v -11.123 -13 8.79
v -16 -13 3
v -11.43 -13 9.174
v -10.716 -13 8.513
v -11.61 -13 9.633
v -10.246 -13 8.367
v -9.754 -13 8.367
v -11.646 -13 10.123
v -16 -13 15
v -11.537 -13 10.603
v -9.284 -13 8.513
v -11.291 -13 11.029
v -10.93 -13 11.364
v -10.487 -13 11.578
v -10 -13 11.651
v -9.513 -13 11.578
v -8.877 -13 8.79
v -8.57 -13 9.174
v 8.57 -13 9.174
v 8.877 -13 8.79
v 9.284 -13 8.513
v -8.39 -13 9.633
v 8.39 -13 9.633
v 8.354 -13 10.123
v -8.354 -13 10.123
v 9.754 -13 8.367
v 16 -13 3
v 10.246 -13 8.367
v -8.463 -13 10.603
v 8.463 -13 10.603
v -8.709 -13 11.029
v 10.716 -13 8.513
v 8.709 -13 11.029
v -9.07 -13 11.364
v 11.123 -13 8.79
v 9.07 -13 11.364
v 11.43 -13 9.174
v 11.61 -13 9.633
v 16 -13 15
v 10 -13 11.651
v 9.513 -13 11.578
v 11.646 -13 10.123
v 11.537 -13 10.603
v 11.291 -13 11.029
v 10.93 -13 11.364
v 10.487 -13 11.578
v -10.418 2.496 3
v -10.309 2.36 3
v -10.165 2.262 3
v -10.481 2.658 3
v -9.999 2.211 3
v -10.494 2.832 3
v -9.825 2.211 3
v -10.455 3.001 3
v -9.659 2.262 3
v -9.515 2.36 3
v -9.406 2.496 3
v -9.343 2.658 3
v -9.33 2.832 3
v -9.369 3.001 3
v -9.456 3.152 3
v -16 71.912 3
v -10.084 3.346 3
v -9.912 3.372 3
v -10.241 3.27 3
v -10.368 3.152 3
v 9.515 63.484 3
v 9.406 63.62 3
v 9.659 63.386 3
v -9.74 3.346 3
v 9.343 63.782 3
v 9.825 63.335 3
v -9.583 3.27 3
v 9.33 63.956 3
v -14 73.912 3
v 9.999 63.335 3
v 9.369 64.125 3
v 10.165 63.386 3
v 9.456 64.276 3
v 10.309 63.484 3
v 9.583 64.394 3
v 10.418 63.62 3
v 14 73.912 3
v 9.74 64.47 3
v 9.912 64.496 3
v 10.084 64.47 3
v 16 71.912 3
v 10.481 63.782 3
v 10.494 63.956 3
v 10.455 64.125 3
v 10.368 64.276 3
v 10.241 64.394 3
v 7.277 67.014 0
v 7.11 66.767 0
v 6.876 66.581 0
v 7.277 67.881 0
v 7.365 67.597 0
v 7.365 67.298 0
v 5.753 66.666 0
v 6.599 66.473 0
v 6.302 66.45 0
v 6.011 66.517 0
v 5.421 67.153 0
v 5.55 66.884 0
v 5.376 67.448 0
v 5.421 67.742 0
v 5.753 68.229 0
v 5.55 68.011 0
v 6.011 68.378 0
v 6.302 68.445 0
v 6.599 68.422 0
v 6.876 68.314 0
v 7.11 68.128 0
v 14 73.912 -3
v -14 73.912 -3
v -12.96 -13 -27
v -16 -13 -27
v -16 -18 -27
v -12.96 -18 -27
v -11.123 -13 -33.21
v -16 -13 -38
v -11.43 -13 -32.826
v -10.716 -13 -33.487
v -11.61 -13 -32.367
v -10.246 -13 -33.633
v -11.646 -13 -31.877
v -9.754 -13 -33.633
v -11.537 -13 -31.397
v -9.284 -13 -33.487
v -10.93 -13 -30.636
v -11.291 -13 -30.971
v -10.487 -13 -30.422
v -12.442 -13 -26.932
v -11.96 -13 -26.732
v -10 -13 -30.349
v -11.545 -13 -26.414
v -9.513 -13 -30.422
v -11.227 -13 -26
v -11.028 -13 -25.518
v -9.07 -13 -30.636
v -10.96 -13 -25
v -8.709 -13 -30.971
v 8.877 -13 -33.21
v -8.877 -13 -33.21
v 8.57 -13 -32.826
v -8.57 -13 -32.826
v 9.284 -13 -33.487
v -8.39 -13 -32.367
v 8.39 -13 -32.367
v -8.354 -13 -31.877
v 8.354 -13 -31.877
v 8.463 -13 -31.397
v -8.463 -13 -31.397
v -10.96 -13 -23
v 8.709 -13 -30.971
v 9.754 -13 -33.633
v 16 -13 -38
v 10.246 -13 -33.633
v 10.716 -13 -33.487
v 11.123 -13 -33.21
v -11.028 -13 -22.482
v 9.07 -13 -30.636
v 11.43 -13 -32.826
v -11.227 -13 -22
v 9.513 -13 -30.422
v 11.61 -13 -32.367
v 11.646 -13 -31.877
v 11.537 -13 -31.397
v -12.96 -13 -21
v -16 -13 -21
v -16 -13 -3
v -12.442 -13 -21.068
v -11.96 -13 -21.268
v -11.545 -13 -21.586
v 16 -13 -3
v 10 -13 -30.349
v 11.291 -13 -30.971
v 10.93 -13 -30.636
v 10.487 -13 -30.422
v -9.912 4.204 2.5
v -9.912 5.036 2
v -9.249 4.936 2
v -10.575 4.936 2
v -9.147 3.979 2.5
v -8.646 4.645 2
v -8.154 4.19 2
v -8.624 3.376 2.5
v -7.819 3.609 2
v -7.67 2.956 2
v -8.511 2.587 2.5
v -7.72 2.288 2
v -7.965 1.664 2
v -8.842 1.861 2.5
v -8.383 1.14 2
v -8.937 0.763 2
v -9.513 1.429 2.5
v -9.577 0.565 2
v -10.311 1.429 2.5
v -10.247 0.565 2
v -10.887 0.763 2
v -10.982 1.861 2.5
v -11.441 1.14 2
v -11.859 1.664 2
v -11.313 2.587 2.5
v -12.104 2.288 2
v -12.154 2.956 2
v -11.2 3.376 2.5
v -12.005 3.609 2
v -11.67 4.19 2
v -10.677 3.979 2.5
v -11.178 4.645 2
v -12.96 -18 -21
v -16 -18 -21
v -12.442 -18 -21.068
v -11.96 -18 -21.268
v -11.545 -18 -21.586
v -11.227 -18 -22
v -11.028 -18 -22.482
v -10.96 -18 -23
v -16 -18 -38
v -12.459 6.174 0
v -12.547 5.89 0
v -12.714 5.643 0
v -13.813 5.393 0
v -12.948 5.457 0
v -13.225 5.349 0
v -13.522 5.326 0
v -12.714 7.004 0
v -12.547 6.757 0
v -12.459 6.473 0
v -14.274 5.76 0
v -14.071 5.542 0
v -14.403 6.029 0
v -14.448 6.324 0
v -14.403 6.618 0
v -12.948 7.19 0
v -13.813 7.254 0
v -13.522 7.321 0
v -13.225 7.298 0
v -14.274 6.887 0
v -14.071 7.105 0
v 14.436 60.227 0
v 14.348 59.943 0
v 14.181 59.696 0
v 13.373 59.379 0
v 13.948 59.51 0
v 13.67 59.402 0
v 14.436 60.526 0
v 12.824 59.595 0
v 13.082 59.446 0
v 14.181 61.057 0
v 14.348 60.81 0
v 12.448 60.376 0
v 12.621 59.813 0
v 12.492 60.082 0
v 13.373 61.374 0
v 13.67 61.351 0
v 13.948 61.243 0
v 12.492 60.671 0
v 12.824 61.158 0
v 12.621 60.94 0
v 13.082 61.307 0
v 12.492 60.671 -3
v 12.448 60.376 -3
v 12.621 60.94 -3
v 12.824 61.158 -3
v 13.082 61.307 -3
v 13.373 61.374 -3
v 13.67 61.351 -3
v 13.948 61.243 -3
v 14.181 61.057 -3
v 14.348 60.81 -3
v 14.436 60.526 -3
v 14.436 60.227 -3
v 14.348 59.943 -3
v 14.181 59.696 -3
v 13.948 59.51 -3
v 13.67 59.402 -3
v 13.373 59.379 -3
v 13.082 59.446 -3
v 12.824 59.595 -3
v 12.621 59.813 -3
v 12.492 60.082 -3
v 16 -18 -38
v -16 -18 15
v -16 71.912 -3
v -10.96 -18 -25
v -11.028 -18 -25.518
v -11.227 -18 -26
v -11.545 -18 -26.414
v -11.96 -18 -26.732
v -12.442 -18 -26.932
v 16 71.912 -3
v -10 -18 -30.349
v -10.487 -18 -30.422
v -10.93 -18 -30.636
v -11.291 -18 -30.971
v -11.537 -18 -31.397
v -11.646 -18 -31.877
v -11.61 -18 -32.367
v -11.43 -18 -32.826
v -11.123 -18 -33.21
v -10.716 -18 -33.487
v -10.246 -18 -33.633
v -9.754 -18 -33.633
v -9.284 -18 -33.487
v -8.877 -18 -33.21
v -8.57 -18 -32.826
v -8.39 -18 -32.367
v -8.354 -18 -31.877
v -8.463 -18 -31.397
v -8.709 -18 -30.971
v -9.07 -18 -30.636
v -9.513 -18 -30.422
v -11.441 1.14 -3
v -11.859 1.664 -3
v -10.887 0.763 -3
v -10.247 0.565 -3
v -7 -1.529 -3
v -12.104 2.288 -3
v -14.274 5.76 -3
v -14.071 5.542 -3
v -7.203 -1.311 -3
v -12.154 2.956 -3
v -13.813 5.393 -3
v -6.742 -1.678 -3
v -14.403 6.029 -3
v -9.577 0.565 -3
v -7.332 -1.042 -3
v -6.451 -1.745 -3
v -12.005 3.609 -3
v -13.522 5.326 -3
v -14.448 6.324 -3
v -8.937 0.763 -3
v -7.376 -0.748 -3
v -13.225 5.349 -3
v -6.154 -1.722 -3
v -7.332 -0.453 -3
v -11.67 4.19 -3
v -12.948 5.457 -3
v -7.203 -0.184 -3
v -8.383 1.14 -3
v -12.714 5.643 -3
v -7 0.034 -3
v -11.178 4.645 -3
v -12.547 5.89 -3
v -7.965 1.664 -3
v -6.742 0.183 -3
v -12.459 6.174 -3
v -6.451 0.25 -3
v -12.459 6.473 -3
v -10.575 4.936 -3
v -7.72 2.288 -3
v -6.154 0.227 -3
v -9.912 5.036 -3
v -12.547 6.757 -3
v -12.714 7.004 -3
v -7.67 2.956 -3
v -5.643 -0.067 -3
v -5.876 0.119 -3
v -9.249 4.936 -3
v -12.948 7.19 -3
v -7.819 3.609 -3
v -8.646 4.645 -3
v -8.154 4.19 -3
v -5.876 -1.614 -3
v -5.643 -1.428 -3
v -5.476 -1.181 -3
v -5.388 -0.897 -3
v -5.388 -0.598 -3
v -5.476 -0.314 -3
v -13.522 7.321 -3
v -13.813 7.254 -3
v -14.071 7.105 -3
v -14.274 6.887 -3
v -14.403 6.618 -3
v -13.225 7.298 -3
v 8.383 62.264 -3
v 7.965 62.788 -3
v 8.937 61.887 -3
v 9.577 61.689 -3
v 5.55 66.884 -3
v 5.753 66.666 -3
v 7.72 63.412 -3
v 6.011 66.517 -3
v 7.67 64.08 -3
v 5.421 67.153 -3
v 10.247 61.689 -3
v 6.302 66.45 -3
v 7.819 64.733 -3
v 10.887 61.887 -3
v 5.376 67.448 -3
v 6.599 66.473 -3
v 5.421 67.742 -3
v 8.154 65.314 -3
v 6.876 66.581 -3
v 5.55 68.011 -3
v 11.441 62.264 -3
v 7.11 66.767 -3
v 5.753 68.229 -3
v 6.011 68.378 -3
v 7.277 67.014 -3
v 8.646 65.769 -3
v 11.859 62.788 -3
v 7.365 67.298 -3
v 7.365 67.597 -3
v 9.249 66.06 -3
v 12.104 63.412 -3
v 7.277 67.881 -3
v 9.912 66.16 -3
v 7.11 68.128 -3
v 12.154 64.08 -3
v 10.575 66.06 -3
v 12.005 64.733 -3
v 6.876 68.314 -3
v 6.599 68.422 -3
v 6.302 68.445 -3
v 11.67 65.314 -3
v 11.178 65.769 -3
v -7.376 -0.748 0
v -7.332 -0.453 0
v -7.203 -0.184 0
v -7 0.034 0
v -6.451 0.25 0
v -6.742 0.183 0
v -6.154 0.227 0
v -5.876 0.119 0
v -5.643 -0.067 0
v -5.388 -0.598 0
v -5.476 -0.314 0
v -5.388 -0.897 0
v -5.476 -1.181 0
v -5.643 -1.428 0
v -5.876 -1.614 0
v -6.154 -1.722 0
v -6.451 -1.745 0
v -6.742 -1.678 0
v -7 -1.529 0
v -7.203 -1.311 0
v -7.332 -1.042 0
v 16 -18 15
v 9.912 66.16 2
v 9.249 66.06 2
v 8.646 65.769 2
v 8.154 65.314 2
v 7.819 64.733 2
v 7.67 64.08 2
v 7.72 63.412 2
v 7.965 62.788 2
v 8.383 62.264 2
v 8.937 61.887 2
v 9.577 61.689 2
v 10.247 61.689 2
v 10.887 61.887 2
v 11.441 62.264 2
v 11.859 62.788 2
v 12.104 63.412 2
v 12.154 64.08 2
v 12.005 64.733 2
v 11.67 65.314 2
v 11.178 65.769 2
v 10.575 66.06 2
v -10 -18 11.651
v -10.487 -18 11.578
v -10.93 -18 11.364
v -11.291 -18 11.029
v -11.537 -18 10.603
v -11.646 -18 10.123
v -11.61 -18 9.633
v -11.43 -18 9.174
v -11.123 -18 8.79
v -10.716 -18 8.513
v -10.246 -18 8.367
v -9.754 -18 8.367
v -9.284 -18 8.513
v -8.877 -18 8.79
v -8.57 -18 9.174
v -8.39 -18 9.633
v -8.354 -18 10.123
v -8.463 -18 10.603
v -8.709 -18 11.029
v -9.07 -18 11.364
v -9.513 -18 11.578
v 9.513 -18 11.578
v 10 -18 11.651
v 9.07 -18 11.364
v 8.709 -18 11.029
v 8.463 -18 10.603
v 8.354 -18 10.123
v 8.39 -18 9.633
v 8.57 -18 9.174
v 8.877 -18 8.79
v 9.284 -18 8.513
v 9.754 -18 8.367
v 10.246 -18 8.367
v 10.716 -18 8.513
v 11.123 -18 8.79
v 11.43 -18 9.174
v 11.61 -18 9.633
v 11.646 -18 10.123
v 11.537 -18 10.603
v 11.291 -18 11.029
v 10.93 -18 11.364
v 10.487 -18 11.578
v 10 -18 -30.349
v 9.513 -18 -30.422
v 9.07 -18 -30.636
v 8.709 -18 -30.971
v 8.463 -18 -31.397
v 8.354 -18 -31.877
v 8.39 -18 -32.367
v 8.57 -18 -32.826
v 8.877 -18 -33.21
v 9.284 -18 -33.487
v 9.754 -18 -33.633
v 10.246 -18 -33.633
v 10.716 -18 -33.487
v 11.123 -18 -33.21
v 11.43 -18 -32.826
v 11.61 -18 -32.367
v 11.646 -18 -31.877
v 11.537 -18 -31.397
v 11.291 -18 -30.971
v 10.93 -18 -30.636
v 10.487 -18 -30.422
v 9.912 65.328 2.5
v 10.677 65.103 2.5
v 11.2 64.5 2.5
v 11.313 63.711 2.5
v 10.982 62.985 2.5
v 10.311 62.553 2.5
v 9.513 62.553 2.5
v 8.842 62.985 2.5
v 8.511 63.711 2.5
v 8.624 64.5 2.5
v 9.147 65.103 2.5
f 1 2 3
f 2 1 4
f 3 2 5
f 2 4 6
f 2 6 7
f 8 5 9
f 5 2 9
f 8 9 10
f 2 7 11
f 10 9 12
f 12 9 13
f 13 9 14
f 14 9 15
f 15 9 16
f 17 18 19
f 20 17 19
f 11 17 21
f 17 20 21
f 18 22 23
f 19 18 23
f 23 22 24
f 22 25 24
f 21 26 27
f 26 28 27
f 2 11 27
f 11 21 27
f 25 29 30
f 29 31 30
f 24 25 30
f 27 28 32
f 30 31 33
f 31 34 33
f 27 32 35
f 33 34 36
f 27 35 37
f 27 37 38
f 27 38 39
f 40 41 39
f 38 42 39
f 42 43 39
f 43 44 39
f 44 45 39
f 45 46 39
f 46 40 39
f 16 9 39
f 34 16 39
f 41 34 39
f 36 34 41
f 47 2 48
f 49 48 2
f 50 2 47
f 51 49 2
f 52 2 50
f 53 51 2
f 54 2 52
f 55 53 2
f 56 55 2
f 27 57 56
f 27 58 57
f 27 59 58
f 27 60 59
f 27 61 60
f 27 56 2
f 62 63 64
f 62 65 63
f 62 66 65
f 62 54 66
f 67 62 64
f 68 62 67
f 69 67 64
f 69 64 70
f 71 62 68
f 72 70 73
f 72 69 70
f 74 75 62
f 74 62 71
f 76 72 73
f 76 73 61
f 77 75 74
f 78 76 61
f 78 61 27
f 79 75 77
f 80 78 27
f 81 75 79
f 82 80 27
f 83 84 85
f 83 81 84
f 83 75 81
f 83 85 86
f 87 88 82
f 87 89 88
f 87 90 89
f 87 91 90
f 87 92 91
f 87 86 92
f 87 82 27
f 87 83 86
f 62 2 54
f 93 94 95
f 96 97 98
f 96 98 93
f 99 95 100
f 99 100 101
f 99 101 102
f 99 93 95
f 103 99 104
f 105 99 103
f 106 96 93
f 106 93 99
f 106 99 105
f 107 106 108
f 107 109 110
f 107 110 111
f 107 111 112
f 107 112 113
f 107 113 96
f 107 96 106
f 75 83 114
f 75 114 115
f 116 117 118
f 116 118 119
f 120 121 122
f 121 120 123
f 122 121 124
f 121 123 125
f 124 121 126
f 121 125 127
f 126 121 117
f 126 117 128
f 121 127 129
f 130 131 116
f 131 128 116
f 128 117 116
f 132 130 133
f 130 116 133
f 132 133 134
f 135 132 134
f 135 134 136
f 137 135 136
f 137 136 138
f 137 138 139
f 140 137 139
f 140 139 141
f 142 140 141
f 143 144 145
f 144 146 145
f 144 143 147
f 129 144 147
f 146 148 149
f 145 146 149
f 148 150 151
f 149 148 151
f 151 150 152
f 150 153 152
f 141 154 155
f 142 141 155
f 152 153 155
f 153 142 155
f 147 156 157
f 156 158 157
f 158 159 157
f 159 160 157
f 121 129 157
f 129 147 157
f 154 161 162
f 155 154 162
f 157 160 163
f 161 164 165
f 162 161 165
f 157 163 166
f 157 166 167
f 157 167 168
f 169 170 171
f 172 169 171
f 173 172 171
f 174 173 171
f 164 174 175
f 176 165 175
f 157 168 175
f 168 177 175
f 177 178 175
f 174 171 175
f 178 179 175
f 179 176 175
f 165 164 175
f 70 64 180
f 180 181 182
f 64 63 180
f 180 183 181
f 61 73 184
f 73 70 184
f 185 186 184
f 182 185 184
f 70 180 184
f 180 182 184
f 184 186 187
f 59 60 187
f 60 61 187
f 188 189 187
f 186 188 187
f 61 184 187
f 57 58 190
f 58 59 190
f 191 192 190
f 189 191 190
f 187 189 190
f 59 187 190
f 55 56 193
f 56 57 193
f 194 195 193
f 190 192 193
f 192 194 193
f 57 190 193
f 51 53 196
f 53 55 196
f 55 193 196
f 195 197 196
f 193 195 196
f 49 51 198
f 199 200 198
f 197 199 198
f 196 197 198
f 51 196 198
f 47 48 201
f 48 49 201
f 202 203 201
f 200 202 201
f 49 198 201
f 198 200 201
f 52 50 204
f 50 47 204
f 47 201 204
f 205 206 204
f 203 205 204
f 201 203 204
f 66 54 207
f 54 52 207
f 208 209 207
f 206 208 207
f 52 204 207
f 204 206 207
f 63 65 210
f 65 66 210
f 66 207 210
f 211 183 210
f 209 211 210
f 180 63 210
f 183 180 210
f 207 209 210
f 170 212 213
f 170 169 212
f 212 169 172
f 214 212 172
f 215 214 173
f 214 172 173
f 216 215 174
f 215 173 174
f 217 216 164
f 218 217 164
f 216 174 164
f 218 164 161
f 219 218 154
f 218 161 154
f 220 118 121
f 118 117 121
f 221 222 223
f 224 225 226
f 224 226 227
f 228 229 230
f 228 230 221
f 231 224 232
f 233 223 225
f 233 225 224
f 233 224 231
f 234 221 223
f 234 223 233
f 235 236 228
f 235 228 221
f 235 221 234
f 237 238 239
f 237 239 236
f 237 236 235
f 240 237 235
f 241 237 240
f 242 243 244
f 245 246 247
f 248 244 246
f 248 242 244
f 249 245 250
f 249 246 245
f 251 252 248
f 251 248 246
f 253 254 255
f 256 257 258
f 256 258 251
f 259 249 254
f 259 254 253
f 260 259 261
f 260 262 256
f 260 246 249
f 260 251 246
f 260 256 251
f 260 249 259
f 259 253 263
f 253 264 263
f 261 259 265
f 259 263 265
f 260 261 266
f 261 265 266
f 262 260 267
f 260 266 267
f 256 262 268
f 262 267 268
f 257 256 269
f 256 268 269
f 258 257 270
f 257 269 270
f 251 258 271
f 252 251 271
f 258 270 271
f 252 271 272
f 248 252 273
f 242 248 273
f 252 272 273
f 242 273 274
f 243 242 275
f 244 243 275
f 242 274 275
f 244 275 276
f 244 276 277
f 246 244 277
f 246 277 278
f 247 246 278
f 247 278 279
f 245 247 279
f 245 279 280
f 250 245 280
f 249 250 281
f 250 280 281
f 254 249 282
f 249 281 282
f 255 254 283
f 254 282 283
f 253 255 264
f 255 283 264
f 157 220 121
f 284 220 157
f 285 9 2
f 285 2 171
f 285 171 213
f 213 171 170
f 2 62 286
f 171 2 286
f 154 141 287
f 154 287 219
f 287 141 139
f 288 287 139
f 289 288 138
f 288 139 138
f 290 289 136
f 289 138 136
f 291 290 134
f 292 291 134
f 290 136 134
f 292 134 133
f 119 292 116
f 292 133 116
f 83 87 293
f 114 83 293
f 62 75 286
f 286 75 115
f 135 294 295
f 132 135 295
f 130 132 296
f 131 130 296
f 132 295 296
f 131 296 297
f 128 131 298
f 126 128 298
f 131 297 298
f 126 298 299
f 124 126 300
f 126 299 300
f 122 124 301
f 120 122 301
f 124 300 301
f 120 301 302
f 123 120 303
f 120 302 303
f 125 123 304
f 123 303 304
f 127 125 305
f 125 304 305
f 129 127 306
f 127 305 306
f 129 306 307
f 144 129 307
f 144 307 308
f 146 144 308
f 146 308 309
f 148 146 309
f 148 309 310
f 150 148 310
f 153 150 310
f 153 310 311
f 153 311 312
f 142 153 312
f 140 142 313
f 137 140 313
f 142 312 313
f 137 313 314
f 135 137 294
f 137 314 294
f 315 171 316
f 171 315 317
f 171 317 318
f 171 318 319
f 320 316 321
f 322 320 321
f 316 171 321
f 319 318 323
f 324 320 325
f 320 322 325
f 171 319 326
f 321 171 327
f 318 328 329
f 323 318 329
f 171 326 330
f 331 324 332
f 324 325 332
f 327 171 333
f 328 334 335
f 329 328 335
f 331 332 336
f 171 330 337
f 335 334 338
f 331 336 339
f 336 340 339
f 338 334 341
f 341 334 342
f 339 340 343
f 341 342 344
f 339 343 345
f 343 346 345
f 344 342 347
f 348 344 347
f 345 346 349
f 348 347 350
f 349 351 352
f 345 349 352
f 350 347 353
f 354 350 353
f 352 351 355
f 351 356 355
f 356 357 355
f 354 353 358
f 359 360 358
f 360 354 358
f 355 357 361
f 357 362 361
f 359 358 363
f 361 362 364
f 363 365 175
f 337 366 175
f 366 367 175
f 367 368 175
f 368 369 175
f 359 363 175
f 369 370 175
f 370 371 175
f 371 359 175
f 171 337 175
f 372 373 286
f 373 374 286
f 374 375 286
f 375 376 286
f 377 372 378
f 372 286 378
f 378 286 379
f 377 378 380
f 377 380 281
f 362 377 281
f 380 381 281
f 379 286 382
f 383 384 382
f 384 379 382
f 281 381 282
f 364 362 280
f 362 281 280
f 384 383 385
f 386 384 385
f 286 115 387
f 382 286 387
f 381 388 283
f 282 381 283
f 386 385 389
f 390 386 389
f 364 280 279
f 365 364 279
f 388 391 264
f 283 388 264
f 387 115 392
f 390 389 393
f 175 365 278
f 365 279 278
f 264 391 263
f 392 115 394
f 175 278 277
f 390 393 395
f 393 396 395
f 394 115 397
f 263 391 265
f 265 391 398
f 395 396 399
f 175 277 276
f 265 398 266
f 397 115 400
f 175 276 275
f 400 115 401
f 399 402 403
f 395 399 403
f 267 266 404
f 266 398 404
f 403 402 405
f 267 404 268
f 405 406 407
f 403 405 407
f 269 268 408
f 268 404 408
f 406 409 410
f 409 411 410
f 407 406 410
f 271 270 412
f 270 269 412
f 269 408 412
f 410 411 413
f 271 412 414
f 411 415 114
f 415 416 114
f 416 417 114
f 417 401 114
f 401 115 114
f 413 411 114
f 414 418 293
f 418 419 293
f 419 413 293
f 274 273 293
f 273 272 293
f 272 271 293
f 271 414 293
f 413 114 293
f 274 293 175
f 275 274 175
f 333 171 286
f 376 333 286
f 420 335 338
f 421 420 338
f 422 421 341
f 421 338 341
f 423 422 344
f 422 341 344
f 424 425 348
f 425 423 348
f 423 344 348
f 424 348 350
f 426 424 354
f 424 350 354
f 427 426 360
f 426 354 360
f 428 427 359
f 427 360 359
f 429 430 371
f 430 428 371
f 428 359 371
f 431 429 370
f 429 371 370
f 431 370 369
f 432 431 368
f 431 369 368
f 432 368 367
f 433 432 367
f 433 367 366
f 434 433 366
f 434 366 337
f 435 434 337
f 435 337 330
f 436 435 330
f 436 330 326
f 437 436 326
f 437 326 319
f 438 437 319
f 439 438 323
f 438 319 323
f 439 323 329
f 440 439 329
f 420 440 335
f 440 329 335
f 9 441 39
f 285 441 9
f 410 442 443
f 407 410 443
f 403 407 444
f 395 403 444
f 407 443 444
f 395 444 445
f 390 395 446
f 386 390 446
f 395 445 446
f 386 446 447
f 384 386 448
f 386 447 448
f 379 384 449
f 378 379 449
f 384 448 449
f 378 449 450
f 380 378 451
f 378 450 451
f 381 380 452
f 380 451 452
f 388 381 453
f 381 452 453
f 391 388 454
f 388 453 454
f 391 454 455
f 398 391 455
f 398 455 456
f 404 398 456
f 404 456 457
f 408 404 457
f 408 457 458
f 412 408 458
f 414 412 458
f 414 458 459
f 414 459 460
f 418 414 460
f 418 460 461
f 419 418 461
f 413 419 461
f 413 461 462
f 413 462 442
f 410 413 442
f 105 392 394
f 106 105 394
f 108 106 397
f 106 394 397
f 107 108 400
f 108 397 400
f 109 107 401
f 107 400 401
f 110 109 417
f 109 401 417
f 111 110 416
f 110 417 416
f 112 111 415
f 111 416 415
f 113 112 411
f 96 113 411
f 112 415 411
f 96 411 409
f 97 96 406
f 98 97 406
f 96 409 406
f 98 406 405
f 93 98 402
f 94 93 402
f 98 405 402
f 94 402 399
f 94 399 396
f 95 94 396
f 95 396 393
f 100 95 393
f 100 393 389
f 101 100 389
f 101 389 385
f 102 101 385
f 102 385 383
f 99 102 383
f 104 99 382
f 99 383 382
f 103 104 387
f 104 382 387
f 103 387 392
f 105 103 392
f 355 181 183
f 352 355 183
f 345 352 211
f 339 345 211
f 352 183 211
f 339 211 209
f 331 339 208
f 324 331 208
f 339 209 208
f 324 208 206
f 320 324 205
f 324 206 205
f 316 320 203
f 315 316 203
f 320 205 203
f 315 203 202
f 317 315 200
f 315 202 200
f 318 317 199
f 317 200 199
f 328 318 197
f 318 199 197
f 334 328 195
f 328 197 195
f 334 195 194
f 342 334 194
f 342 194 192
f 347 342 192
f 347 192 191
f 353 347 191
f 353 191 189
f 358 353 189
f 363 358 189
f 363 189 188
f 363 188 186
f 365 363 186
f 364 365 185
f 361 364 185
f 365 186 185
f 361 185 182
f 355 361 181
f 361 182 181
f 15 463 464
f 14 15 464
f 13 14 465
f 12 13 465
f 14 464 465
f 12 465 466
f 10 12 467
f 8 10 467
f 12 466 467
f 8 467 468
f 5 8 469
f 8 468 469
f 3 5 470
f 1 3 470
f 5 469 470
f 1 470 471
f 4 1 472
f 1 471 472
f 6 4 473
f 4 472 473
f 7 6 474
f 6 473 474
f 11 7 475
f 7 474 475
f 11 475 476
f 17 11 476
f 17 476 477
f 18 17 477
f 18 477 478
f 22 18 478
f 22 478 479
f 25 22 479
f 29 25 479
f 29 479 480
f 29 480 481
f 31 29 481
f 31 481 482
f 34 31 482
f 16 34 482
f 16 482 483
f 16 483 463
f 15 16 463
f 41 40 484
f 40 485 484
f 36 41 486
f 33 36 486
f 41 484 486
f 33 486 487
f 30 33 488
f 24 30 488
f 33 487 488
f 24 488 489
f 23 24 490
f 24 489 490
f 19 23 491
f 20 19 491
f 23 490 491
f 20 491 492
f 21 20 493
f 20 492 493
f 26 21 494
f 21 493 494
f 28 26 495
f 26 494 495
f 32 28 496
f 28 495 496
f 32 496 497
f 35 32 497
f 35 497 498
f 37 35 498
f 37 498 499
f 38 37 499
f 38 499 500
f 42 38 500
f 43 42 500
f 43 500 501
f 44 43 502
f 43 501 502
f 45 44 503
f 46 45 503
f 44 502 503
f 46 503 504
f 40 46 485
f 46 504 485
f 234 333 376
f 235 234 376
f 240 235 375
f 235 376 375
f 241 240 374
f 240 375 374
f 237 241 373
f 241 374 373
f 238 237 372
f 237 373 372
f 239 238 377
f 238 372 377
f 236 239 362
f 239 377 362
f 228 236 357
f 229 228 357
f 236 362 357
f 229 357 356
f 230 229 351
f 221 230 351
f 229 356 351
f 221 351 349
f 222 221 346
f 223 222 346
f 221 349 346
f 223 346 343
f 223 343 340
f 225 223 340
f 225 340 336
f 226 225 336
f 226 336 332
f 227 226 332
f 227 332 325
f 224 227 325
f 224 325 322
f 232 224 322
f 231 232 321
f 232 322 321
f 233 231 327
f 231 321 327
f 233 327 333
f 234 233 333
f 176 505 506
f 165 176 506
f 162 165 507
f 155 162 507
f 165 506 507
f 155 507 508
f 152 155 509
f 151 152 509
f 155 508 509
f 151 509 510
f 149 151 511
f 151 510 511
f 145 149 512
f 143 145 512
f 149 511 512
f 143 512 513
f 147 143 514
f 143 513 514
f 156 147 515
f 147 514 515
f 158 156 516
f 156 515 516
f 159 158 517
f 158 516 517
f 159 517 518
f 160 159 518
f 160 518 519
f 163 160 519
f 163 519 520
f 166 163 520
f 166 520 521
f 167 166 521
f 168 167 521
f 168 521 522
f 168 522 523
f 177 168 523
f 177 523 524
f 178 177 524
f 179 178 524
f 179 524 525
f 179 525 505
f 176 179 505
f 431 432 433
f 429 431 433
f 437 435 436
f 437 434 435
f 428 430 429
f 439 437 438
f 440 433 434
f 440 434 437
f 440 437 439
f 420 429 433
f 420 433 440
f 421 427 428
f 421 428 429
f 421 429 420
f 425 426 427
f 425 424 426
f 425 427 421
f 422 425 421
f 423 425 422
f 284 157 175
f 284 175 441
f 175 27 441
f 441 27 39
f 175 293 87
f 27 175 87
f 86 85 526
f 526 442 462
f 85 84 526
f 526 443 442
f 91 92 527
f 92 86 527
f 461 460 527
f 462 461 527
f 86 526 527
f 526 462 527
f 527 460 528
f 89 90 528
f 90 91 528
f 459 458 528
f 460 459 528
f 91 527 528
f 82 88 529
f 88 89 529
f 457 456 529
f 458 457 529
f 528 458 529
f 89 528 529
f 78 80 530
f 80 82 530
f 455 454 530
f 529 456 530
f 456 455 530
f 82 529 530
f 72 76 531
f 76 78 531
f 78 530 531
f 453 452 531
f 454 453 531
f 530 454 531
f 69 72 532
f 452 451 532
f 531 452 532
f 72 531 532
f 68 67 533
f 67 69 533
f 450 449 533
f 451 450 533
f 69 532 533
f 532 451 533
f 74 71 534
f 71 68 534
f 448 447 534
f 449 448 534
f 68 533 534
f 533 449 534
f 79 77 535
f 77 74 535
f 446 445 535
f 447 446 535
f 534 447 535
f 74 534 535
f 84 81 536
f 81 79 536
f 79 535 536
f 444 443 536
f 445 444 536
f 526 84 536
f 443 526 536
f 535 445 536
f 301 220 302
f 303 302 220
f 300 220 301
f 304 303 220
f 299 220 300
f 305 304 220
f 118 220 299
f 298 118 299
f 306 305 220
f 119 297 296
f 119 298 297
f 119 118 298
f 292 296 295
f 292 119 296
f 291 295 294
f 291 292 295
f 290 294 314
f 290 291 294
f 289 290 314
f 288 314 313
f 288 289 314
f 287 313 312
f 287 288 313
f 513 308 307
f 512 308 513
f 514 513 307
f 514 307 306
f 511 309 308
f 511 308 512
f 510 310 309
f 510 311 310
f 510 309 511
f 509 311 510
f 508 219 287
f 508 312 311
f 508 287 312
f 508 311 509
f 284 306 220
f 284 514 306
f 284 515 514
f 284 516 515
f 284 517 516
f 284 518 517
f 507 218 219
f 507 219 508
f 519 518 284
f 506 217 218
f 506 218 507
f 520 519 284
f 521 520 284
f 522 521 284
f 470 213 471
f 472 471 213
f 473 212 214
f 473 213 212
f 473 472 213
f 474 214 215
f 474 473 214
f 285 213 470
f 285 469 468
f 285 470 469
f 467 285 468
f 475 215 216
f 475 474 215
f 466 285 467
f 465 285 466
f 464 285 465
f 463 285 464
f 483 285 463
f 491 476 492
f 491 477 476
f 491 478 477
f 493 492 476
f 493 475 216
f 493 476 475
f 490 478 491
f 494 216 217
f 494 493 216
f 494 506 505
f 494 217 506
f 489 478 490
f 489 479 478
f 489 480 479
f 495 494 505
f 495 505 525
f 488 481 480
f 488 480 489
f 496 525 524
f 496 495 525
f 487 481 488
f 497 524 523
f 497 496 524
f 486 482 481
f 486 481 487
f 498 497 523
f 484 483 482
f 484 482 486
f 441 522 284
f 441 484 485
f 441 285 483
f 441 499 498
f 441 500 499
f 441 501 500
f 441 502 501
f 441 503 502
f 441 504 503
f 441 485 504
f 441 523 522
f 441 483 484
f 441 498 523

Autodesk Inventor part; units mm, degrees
ref_plane "YZ Plane" through (0, 0, 0) normal (1, 0, 0) x (0, 1, 0)
ref_plane "XZ Plane" through (0, 0, 0) normal (0, 1, 0) x (-1, 0, 0)
ref_plane "XY Plane" through (0, 0, 0) normal (0, 0, 1) x (1, 0, 0)
sketch "Sketch1" plane through (0, 0, 0) normal (0, 1, 0) x (-1, 0, 0)
  line L0 (16, 3) -> (-16, 3)
  line L1 (-16, 3) -> (-16, -3)
  line L2 (-16, -3) -> (16, -3)
  line L3 (16, -3) -> (16, 3)
  line L4 (16, 3) -> (-16, -3) construction
  line L5 (-16, 3) -> (16, -3) construction
  point P0 (0, 0)
  dimension "POST_THICKNESS" = 6
  dimension "POST_WIDTH" = 32
extrude "Extrusion1" add sketch "Sketch1" along normal blind 73.912
sketch "Sketch5" plane through (16, 73.912, -3) normal (0, 0, -1) x (-1, 0, 0)
  line L0 (0, 0) -> (32, 0) projected
  line L1 (16.088, 0) -> (0, -16.088)
  line L2 (0, -73.912) -> (0, 0) projected
  circle A0 centre (6.088, -10) radius 1.75
  circle A1 centre (9.6235, -6.4645) radius 1
  circle A2 centre (2.5525, -13.5355) radius 1
  line L3 (32.1913, -64.8447) -> (19.6606, -77.3754)
  circle A3 centre (29.4475, -67.5885) radius 1
  circle A4 centre (22.3765, -74.6595) radius 1
  line L4 (32, -73.912) -> (32, 0) projected
  circle A5 centre (25.912, -71.124) radius 1.75
  line L5 (0, -73.912) -> (32, -73.912) projected
  point P0 (16, -73.912)
  point P1 (0, -58)
  point P2 (32, -58)
  dimension "d33" = 45
  dimension "d35" = 0
  dimension "d36" = 5
  dimension "d37" = 5
  dimension "d38" = 45
  dimension "d39" = 9.9999
  dimension "d42" = 0
  dimension "d43" = 5
  dimension "d44" = 2
  dimension "d45" = 2
  dimension "d46" = 2
  dimension "d47" = 2
  dimension "BOTTOM_MIRROR_HOLE" = 2.788
  dimension "TOP_MIRROR_HOLE" = 63.912
  dimension "d90" = 9.912
  dimension "d91" = 9.912
  dimension "d92" = 3.5
  dimension "d93" = 3.5
extrude "Extrusion3" cut sketch "Sketch5" against normal blind 3 contours A1 L1 | L1 A1 | A2 L1 | L1 A2 | L5 A4 L3 | A4 L5 | A3 L3 | L3 A3 | L3 A4 picked at (22.0928, -74.8345)
sketch "Sketch6" plane through (16, 0, -3) normal (0, 0, -1) x (-1, 0, 0)
  line L0 (0, 0) -> (0, 73.912) projected
  line L1 (0, 0) -> (32, 0) projected
  line L2 (0, 2) -> (32, 2)
  line L3 (32, 2) -> (32, 0)
  line L4 (32, 0) -> (0, 0)
  line L5 (0, 0) -> (0, 2)
  point P0 (16, 0)
  dimension "BASE_HEIGHT" = 2
extrude "Extrusion4" [suppressed]
sketch "Sketch7" plane through (-16, 2, -3) normal (0, 1, 0) x (1, 0, 0)
  line L0 (0, 35) -> (32, 35) projected
  line L1 (0, 0) -> (0, 35) projected
  line L2 (32, 0) -> (32, 35) projected
  point P0 (16, -3)
  point P1 (26, 29)
  point P2 (6, 29)
  dimension "d60" = 6
  dimension "d61" = 6
  dimension "d62" = 6
  dimension "d63" = 0
hole "Hole3" [suppressed]
sketch "Sketch8" plane through (16, 73.912, -3) normal (0, 0, -1) x (-1, 0, 0)
  line L0 (0, 0) -> (32, 0)
  line L1 (12.088, 0) -> (0, -12.088)
  line L2 (0, -60) -> (0, 0)
  circle A0 centre (6.088, -6) radius 1.651
  circle A1 centre (9.6235, -2.4645) radius 1
  circle A2 centre (2.5525, -9.5355) radius 1
  line L3 (32.1913, -28.7207) -> (19.6606, -41.2514)
  circle A3 centre (29.4475, -31.4645) radius 1
  circle A4 centre (22.3765, -38.5355) radius 1
  line L4 (32, -60) -> (32, 0)
  circle A5 centre (25.912, -35) radius 1.651
  point P0 (16, -73.912)
  point P1 (16, -60)
  point P2 (0, -58)
  point P3 (32, -58)
  dimension "d64" = 45
  dimension "d65" = 0
  dimension "d66" = 5
  dimension "d67" = 5
  dimension "d68" = 45
  dimension "d69" = 9.9999
  dimension "d70" = 0
  dimension "d71" = 5
  dimension "d72" = 2
  dimension "d73" = 2
  dimension "d74" = 2
  dimension "d75" = 2
hole "Hole4" [suppressed]
chamfer "Chamfer1" distance 2 angle 45 2 edges at (-16, 73.912, 0) (16, 73.912, 0)
hole "Hole5" at (9.912, 63.912, -3) at (-9.912, 2.788, -3) direction (0, 0, 1) diameter 4.496 depth 5 tip angle 118 clearance for "Flat Head Machine Screw (82)" size "#8" standard "Ansi Unified Screw Threads"
sketch "Sketch10" plane through (0, 0, 0) normal (0, -1, 0) x (1, 0, 0)
  line L0 (14, 3) -> (16, 3) projected
  line L1 (-14, -3) -> (-16, -3) projected
  line L2 (16, 3) -> (-16, 3)
  line L3 (-16, 3) -> (-16, -3)
  line L4 (-16, -3) -> (16, -3)
  line L5 (16, -3) -> (16, 3)
  point P0 (0, 0)
extrude "Extrusion6" add sketch "Sketch10" along normal blind 18
sketch "Sketch11" plane through (0, -18, 0) normal (0, -1, 0) x (1, 0, 0)
  line L0 (16, 25) -> (-16, 25)
  line L1 (-16, 25) -> (-16, -38)
  line L2 (-16, -38) -> (16, -38)
  line L3 (16, -38) -> (16, 25)
  line L4 (-16, 25) -> (16, 25)
  line L5 (16, 25) -> (16, 15)
  line L6 (16, 15) -> (-16, 15)
  line L7 (-16, 15) -> (-16, 25)
  line L8 (16, -3) -> (-16, -3)
  point P0 (0, 0)
  point P1 (-16, 15)
  dimension "d107" = 32
  dimension "d124" = 10
  dimension "d125" = 35
extrude "Extrusion7" add sketch "Sketch11" against normal blind 5 contours L3 L8 L1 L6 | L3 L2 L1 L8
sketch "Sketch12" plane through (0, -13, 0) normal (0, 1, 0) x (1, 0, 0)
  point P0 (0, 0)
  point P1 (-10, 32)
  point P2 (10, 32)
  point P3 (-10, -10)
  point P4 (10, -10)
  dimension "d116" = 10
  dimension "d117" = 10
  dimension "d118" = 32
  dimension "d119" = 32
  dimension "d120" = 10
  dimension "d121" = 10
  dimension "d122" = 20
  dimension "d123" = 10
hole "Hole6" at (-10, -13, -32) at (10, -13, -32) at (-10, -13, 10) at (10, -13, 10) direction (0, -1, 0) diameter 3.302 depth 8 thread size "8-32 UNC" class "2B" standard "ANSI Unified Screw Threads"
sketch "Sketch14" plane through (0, -13, 0) normal (0, 1, 0) x (1, 0, 0)
  line L0 (-16, -15) -> (-16, 38) projected
  line L1 (-16, 27) -> (-12.9595, 27)
  line L2 (-10.9595, 25) -> (-10.9595, 23)
  line L3 (-12.9595, 21) -> (-16, 21)
  line L4 (-16, 21) -> (-16, 27)
  line L5 (14, 3) -> (-14, 3) projected
  arc A0 (-12.9595, 21) -> (-10.9595, 23) centre (-12.9595, 23) ccw
  arc A1 (-10.9595, 25) -> (-12.9595, 27) centre (-12.9595, 25) ccw
  point P0 (0, 0)
  point P1 (-10.9595, 21)
  point P2 (-10.9595, 27)
  dimension "d127" = 6
  dimension "d128" = 18
  dimension "d131" = 2
extrude "Extrusion8" cut sketch "Sketch14" against normal blind 10
extrude "Extrusion9" cut sketch "Sketch5" against normal blind 3 contours L5 A4 L3 | A4 L5 | L3 A4 picked at (22.0928, -74.8345)
equation "\"BOTTOM_MIRROR_HOLE\" = GROUND_BEAM_HEIGHT - POLARIS_HOLE_TO_MIRROR_HEIGHT"
equation "\"TOP_MIRROR_HOLE\" = LASER_BEAM_HEIGHT + POLARIS_HOLE_TO_MIRROR_HEIGHT"
equation "\"d90\" = POLARIS_HOLE_TO_MIRROR_HEIGHT"
equation "\"d91\" = POLARIS_HOLE_TO_MIRROR_HEIGHT"
equation "\"WING_SIZE\" = 8"
equation "\"POLARIS_HOLE_TO_MIRROR_HEIGHT\" = 9.912"
equation "\"GROUND_BEAM_HEIGHT\" = 12.7"
equation "\"LASER_BEAM_HEIGHT\" = 54"
properties part number "L periscope"
